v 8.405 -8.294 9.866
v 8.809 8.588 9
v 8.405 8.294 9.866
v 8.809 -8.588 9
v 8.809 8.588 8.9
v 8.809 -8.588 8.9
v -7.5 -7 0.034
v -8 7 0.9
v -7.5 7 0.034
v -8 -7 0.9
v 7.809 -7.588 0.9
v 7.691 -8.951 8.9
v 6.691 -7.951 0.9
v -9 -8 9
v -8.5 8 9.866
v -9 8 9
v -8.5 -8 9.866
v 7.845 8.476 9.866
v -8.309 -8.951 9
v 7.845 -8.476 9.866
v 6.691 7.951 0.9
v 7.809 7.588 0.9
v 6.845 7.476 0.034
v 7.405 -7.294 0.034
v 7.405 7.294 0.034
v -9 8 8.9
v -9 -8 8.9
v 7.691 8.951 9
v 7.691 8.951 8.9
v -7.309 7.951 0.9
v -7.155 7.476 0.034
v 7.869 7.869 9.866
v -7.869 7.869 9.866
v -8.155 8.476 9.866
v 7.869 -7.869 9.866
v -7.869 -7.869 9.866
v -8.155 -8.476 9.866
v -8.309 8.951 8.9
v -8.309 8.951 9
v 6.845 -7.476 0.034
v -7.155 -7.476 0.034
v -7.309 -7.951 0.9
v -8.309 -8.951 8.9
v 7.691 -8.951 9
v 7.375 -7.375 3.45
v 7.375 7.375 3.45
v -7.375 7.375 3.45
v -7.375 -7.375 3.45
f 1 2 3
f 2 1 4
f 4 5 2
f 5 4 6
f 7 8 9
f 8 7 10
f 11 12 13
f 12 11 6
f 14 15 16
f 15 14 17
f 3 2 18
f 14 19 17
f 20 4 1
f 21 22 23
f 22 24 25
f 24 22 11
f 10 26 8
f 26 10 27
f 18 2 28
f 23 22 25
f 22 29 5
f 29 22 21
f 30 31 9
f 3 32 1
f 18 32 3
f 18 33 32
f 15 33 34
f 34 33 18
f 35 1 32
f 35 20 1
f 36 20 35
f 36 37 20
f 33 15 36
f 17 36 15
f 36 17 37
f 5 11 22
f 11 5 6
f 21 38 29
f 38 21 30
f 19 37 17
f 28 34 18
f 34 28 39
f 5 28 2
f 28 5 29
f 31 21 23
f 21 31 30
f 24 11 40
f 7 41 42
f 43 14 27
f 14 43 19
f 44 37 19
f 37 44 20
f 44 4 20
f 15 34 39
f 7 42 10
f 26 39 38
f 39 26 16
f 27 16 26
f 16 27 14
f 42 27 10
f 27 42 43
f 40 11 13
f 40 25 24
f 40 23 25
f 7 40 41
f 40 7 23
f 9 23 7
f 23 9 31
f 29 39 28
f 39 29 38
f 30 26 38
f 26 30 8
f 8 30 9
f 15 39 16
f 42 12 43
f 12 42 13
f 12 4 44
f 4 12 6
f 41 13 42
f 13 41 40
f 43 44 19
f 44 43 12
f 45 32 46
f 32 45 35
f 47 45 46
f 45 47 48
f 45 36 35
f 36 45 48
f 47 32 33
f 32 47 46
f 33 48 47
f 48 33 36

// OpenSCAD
// More information: https://danielupshaw.com/openscad-rounded-corners/

module roundedcube_simple(size = [1, 1, 1], center = false, radius = 0.5) {
	// If single value, convert to [x, y, z] vector
	size = (size[0] == undef) ? [size, size, size] : size;

	translate = (center == false) ?
		[radius, radius, radius] :
		[
			radius - (size[0] / 2),
			radius - (size[1] / 2),
			radius - (size[2] / 2)
	];

	translate(v = translate)
	minkowski() {
		cube(size = [
			size[0] - (radius * 2),
			size[1] - (radius * 2),
			size[2] - (radius * 2)
		]);
		sphere(r = radius);
	}
}

module roundedcube_tapered(size = [1, 1, 1], center = false, radius = 0.5) {
	// If single value, convert to [x, y, z] vector
	size = (size[0] == undef) ? [size, size, size] : size;

	translate = (center == false) ?
		[radius, radius, radius] :
		[
			radius - (size[0] / 2),
			radius - (size[1] / 2),
			radius - (size[2] / 2)
	];

	translate(v = translate)

    hull() {

        minkowski() {
            cube(size = [
                size[0] - (radius * 2),
                size[1] - (radius * 2),
                0.1 //size[2] - (radius * 2)
            ]);
            sphere(r = radius);
        }

        translate([+1, +1, size[2]]) {
            minkowski() {
                cube(size = [
                    size[0] - 2 - (radius * 2),
                    size[1] - 2 - (radius * 2),
                    0.1 //size[2] - 2 - (radius * 2)
                ]);
                sphere(r = radius);
            }
        }
    }
}


// Module: Create tapering cube
module tapered_cube(bottom_size, top_size, height) {
    hull() {
        // Bottom cube
        cube(bottom_size, center = true);

        // Top cube (translated up)
        translate([0, 0, height]) {
            cube(top_size, center = true);
        }
    }
}
    
//translate(v = [2.5, -0.5, 5])
//translate(v = [0, 0, 0])
//color("Yellow")
//roundedcube_simple([14, 14, 7], false, 0.5);

rotate([0, 180, 0])
translate([0, 0, -6])
difference() {

    color("Yellow")
        translate(v = [0, 0, 0])
        roundedcube_tapered([18, 18, 8], true, 1);

    // Create a tapering cube hole on inside
    color("red")
        translate([0, 0, -4])
        tapered_cube(bottom_size = [15.75, 15.75, 0.1], top_size = [14.75, 14.75, 0.1], height = 6.5);
}
